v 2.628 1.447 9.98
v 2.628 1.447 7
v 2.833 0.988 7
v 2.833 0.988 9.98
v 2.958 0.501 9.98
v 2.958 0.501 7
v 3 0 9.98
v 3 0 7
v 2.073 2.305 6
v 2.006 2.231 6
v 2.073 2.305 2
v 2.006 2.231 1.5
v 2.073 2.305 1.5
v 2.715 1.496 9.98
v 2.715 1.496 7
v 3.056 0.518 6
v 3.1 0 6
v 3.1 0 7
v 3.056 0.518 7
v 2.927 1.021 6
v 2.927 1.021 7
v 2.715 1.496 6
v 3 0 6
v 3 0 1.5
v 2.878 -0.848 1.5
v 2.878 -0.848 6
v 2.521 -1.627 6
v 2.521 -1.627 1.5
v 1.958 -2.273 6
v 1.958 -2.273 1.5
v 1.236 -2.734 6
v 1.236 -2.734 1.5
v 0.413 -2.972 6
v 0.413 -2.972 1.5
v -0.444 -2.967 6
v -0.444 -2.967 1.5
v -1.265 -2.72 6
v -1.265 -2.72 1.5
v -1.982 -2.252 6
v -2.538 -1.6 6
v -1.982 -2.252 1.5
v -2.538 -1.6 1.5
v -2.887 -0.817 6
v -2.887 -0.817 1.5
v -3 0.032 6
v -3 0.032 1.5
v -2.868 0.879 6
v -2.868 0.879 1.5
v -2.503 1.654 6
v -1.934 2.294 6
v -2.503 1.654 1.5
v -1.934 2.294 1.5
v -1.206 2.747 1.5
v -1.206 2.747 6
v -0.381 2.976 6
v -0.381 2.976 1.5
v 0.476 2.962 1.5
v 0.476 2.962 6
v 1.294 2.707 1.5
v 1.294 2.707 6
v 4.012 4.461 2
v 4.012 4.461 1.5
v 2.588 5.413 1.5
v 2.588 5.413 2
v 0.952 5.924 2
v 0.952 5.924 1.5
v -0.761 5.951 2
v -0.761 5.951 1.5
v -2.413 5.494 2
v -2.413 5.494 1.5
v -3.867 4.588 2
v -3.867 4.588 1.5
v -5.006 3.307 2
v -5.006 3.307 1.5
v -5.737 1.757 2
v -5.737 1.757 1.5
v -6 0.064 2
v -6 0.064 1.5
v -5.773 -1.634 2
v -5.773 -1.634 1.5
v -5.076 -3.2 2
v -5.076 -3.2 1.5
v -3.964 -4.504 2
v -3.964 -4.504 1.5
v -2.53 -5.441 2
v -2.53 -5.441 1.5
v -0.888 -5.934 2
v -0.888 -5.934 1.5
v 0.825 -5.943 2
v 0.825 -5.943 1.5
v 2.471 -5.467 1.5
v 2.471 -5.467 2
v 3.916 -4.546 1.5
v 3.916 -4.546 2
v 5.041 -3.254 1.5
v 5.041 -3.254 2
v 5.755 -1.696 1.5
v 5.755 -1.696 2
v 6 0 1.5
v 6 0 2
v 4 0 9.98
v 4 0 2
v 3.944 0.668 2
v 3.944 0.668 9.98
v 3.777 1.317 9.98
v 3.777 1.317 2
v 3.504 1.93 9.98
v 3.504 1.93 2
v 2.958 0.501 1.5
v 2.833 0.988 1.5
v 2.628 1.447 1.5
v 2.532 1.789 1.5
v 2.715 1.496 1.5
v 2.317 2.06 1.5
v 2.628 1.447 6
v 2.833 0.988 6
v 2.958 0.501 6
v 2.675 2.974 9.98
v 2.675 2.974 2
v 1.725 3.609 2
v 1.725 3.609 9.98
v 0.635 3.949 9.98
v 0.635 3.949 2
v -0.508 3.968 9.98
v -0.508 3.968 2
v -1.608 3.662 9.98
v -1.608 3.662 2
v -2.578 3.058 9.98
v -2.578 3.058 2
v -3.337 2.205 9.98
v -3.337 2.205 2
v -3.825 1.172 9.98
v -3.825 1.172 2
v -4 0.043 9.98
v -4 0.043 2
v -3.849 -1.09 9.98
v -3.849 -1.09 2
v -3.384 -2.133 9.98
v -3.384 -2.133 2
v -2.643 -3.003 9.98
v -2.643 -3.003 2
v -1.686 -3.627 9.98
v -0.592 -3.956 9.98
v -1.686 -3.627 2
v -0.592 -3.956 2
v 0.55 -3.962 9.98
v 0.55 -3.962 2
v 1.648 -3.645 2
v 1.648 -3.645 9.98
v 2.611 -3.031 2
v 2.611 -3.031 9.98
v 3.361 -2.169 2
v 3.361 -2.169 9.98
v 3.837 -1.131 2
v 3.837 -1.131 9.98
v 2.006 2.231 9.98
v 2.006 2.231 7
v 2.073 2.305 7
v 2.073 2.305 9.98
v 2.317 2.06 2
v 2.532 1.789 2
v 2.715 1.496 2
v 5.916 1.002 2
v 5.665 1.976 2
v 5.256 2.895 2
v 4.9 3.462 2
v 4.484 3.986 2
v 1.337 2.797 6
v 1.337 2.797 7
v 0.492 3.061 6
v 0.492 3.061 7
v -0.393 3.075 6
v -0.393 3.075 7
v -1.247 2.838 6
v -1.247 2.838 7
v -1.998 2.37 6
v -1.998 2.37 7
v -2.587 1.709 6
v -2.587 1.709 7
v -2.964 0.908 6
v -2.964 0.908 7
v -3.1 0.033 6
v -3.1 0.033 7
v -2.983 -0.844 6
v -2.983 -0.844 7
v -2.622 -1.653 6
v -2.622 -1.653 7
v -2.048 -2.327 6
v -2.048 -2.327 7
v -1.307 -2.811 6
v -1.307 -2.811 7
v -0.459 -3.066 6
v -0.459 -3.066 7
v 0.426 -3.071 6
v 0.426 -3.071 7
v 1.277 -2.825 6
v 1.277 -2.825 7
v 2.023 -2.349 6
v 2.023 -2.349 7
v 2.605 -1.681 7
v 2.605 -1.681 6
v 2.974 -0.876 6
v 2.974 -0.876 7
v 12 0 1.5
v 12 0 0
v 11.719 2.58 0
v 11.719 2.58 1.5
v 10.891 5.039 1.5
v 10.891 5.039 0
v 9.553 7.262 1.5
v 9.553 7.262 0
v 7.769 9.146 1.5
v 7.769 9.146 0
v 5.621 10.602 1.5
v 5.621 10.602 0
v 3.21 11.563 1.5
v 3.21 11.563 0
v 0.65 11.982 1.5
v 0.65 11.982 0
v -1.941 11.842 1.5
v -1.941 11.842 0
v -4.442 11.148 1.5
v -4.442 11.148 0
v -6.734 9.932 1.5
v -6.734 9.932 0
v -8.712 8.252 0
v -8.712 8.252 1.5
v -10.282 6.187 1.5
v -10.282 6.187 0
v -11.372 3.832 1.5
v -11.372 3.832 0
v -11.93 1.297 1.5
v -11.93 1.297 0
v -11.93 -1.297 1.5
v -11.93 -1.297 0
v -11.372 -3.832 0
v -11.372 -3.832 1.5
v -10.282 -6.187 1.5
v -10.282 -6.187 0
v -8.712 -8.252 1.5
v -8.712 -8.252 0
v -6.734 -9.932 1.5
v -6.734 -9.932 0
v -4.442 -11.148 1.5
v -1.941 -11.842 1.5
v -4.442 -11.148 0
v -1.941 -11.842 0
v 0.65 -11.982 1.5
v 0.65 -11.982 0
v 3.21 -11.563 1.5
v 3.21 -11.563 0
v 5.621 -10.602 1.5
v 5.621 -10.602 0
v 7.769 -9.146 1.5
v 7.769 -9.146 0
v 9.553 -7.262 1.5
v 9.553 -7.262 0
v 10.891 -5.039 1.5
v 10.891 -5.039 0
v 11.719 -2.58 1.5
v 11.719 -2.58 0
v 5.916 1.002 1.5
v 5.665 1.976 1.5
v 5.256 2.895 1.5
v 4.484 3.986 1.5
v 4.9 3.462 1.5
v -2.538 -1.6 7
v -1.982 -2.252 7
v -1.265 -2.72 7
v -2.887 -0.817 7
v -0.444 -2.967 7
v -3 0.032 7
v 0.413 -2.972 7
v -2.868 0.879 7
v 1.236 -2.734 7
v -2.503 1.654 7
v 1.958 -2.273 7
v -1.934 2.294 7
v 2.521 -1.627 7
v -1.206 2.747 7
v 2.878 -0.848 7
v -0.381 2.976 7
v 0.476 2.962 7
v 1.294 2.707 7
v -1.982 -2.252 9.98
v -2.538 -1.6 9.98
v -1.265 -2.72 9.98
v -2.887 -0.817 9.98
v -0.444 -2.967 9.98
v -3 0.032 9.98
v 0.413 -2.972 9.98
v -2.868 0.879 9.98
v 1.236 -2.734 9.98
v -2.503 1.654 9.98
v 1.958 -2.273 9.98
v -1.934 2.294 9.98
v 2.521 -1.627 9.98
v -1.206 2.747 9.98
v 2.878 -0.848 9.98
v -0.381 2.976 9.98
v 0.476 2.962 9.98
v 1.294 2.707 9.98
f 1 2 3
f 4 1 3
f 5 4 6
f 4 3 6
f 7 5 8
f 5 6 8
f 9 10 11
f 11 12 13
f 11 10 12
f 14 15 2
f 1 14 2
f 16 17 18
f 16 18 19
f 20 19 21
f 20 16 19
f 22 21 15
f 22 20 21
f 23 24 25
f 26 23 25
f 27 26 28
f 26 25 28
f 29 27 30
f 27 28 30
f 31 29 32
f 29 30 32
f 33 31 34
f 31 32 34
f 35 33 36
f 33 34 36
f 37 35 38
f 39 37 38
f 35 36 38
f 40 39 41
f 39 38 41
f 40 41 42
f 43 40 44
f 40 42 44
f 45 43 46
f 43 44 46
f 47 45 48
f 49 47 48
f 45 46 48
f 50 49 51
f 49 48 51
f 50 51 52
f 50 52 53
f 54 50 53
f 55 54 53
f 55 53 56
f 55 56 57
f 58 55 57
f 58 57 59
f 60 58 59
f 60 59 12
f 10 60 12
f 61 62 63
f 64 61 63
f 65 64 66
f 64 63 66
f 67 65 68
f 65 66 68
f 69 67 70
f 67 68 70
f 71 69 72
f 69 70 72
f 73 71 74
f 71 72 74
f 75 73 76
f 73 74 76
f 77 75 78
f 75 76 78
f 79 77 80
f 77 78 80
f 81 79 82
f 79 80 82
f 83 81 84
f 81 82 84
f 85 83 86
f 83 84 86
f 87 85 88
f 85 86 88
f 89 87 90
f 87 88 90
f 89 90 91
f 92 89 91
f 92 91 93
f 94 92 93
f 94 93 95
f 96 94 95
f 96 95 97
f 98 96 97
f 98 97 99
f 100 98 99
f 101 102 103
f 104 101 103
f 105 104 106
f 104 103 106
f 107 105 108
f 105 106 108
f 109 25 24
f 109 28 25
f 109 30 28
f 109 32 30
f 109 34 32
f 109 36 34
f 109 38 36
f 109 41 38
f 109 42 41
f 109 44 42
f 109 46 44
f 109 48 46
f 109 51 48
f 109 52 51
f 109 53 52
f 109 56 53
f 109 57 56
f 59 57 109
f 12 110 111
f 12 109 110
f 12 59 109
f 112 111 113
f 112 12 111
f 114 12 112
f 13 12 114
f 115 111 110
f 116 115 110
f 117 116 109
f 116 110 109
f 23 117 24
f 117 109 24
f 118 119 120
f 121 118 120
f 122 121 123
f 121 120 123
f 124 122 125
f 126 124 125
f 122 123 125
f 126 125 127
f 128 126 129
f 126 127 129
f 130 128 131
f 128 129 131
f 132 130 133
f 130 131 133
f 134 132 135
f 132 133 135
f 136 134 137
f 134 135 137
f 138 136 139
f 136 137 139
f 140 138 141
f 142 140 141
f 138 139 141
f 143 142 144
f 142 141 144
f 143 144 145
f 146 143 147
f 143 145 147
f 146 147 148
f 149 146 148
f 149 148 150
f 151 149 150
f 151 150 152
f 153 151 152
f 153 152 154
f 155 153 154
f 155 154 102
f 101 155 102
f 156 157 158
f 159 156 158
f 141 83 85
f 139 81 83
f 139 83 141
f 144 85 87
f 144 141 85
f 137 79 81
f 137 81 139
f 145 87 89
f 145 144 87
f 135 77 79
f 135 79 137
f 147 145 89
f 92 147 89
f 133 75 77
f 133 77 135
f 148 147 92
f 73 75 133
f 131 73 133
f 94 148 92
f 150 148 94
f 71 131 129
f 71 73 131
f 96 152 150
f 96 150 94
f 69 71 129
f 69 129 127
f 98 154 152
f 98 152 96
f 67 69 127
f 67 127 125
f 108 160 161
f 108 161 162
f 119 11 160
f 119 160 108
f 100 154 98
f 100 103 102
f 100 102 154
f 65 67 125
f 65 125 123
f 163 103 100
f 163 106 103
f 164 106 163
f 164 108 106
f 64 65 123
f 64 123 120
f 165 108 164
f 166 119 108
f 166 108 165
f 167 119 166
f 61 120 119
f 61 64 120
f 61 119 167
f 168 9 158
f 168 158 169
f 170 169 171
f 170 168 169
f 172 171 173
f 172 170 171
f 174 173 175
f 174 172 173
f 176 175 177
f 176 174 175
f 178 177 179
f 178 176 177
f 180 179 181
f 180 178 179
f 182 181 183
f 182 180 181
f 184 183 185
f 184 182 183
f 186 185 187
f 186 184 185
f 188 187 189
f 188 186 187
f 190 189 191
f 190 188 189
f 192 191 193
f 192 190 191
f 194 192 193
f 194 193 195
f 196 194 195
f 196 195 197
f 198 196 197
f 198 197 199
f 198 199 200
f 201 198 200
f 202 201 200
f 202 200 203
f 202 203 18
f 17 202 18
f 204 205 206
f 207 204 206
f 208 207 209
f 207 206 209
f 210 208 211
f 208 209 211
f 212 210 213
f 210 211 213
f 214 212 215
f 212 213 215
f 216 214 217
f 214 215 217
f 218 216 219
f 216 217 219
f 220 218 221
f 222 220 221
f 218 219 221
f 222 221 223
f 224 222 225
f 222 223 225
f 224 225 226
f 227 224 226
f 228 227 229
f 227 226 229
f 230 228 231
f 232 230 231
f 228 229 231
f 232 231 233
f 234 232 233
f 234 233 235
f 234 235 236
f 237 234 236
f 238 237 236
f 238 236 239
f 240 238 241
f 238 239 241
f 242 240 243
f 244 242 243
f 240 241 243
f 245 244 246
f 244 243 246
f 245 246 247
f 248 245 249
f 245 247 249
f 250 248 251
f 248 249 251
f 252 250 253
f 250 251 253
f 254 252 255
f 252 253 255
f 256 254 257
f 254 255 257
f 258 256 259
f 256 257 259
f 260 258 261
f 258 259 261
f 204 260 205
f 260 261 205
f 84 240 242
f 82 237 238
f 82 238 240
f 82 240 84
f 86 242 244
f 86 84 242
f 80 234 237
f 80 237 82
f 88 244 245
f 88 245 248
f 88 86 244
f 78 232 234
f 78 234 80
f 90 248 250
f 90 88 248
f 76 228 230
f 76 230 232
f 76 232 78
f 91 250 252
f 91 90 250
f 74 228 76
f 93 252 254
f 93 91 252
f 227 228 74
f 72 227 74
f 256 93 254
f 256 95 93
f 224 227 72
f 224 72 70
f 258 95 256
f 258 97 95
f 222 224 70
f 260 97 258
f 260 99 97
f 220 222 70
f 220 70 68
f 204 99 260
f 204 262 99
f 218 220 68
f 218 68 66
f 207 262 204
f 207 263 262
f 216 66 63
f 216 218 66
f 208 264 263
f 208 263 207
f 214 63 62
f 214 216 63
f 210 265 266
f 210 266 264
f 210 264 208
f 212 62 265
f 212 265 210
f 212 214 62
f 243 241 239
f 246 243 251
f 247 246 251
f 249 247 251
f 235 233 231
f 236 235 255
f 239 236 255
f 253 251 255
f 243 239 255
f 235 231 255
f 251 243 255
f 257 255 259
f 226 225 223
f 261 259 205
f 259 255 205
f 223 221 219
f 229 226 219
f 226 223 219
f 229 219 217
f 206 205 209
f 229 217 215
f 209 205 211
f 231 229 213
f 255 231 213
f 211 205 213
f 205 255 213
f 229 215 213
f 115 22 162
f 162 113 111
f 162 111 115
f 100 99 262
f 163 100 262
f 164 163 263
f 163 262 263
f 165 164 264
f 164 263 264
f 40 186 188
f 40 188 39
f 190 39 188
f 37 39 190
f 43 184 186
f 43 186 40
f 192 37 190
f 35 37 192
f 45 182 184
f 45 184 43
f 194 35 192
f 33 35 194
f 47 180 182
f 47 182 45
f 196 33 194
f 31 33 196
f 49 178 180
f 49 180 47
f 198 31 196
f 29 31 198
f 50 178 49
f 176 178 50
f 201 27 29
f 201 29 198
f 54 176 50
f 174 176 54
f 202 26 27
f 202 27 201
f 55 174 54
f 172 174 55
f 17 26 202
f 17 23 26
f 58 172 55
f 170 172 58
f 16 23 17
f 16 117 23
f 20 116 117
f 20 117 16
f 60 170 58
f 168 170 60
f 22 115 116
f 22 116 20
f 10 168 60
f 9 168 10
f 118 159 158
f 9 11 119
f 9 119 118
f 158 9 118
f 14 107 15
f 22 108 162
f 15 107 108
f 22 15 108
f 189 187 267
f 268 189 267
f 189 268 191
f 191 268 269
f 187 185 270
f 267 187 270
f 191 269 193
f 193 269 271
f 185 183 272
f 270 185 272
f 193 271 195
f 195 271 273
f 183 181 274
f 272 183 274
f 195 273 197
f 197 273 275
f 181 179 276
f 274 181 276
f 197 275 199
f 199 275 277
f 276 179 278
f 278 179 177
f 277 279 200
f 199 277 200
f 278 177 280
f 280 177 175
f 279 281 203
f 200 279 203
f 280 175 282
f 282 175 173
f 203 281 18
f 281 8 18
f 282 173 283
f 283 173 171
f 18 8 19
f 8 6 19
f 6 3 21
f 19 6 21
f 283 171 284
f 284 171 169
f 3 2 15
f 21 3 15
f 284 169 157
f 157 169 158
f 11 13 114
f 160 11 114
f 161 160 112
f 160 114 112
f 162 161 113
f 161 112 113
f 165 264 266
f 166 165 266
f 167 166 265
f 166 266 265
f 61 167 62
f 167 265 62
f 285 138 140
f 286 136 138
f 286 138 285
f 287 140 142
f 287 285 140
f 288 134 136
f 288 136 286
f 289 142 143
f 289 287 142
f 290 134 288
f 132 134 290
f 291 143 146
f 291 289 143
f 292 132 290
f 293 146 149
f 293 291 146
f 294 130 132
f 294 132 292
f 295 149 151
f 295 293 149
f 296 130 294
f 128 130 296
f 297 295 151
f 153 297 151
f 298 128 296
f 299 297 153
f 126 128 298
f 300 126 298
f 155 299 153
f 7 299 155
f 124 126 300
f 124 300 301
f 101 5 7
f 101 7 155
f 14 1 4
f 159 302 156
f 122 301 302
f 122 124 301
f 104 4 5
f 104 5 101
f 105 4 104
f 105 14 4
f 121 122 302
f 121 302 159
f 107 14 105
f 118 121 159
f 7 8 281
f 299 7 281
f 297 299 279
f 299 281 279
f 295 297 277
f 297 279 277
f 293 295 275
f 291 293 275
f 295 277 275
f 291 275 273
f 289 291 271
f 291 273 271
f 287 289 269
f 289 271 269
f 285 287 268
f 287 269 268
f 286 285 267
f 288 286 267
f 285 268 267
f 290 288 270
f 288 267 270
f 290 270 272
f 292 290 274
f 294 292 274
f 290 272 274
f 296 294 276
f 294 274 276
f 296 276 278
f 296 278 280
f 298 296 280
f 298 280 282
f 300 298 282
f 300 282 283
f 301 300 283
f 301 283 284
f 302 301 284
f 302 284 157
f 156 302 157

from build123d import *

# Parameters (mm, degrees)
F0_R     = 12
F1_DEPTH = 1.5
F2_DEPTH = 2
F3_DEPTH = 9.98
F4_DEPTH = 1


with BuildPart() as f1:
    # F0 (on Top) → F1 (new body)
    with BuildSketch(Plane.XY):
        Circle(F0_R)
        with BuildLine():
            ThreePointArc((4.0121757808, 4.461215698), (4.6995946202, 3.7301220363), (5.2555497929, 2.8946841579))
            ThreePointArc((5.2555497929, 2.8946841579), (5.810907793, 1.4944399022), (6, 0))
            ThreePointArc((6, 0), (-5.4805590356, -2.4420222476), (4.0121757808, 4.461215698))
        make_face(mode=Mode.SUBTRACT)
        with BuildLine():
            ThreePointArc((2.6747838539, 2.9741437986), (3.1330630801, 2.4867480242), (3.503699862, 1.9297894386))
            Line((3.503699862, 1.9297894386), (5.2555497929, 2.8946841579))
            ThreePointArc((5.2555497929, 2.8946841579), (4.6995946202, 3.7301220363), (4.0121757808, 4.461215698))
            Line((4.0121757808, 4.461215698), (2.6747838539, 2.9741437986))
        make_face()
        with BuildLine():
            Line((5.2555497929, 2.8946841579), (3.503699862, 1.9297894386))
            ThreePointArc((3.503699862, 1.9297894386), (3.8739385287, 0.9962932681), (4, 0))
            ThreePointArc((4, 0), (-3.6537060237, -1.6280148317), (2.6747838539, 2.9741437986))
            Line((2.6747838539, 2.9741437986), (4.0121757808, 4.461215698))
            ThreePointArc((4.0121757808, 4.461215698), (-5.4805590356, -2.4420222476), (6, 0))
            ThreePointArc((6, 0), (5.810907793, 1.4944399022), (5.2555497929, 2.8946841579))
        make_face()
        with BuildLine():
            ThreePointArc((2.0060878904, 2.230607849), (2.3497973101, 1.8650610182), (2.6277748965, 1.447342079))
            Line((2.6277748965, 1.447342079), (2.715367393, 1.4955868149))
            ThreePointArc((2.715367393, 1.4955868149), (2.4281238871, 1.9272297188), (2.0729574868, 2.304961444))
            Line((2.0729574868, 2.304961444), (2.0060878904, 2.230607849))
        make_face()
        with BuildLine():
            ThreePointArc((2.6277748965, 1.447342079), (2.9054538965, 0.7472199511), (3, 0))
            ThreePointArc((3, 0), (-2.7402795178, -1.2210111238), (2.0060878904, 2.230607849))
            Line((2.0060878904, 2.230607849), (2.0729574868, 2.304961444))
            ThreePointArc((2.0729574868, 2.304961444), (-2.8316221684, -1.2617114946), (3.1, 0))
            ThreePointArc((3.1, 0), (3.0023023597, 0.7721272828), (2.715367393, 1.4955868149))
            Line((2.715367393, 1.4955868149), (2.6277748965, 1.447342079))
        make_face()
        with BuildLine():
            Line((0, 0), (2.6277748965, 1.447342079))
            ThreePointArc((2.6277748965, 1.447342079), (2.3497973101, 1.8650610182), (2.0060878904, 2.230607849))
            Line((2.0060878904, 2.230607849), (0, 0))
        make_face()
        with BuildLine():
            ThreePointArc((2.0060878904, 2.230607849), (-2.7402795178, -1.2210111238), (3, 0))
            ThreePointArc((3, 0), (2.9054538965, 0.7472199511), (2.6277748965, 1.447342079))
            Line((2.6277748965, 1.447342079), (0, 0))
            Line((0, 0), (2.0060878904, 2.230607849))
        make_face()
        with BuildLine():
            Line((3.503699862, 1.9297894386), (2.715367393, 1.4955868149))
            ThreePointArc((2.715367393, 1.4955868149), (3.0023023597, 0.7721272828), (3.1, 0))
            ThreePointArc((3.1, 0), (-2.8316221684, -1.2617114946), (2.0729574868, 2.304961444))
            Line((2.0729574868, 2.304961444), (2.6747838539, 2.9741437986))
            ThreePointArc((2.6747838539, 2.9741437986), (-3.6537060237, -1.6280148317), (4, 0))
            ThreePointArc((4, 0), (3.8739385287, 0.9962932681), (3.503699862, 1.9297894386))
        make_face()
        with BuildLine():
            ThreePointArc((2.0729574868, 2.304961444), (2.4281238871, 1.9272297188), (2.715367393, 1.4955868149))
            Line((2.715367393, 1.4955868149), (3.503699862, 1.9297894386))
            ThreePointArc((3.503699862, 1.9297894386), (3.1330630801, 2.4867480242), (2.6747838539, 2.9741437986))
            Line((2.6747838539, 2.9741437986), (2.0729574868, 2.304961444))
        make_face()
    extrude(amount=F1_DEPTH)



with BuildPart() as f2:
    # F0 (on Top) → F2 (new body)
    with BuildSketch(Plane.XY):
        with BuildLine():
            ThreePointArc((2.6747838539, 2.9741437986), (3.1330630801, 2.4867480242), (3.503699862, 1.9297894386))
            Line((3.503699862, 1.9297894386), (5.2555497929, 2.8946841579))
            ThreePointArc((5.2555497929, 2.8946841579), (4.6995946202, 3.7301220363), (4.0121757808, 4.461215698))
            Line((4.0121757808, 4.461215698), (2.6747838539, 2.9741437986))
        make_face()
        with BuildLine():
            Line((5.2555497929, 2.8946841579), (3.503699862, 1.9297894386))
            ThreePointArc((3.503699862, 1.9297894386), (3.8739385287, 0.9962932681), (4, 0))
            ThreePointArc((4, 0), (-3.6537060237, -1.6280148317), (2.6747838539, 2.9741437986))
            Line((2.6747838539, 2.9741437986), (4.0121757808, 4.461215698))
            ThreePointArc((4.0121757808, 4.461215698), (-5.4805590356, -2.4420222476), (6, 0))
            ThreePointArc((6, 0), (5.810907793, 1.4944399022), (5.2555497929, 2.8946841579))
        make_face()
        with BuildLine():
            Line((3.503699862, 1.9297894386), (2.715367393, 1.4955868149))
            ThreePointArc((2.715367393, 1.4955868149), (3.0023023597, 0.7721272828), (3.1, 0))
            ThreePointArc((3.1, 0), (-2.8316221684, -1.2617114946), (2.0729574868, 2.304961444))
            Line((2.0729574868, 2.304961444), (2.6747838539, 2.9741437986))
            ThreePointArc((2.6747838539, 2.9741437986), (-3.6537060237, -1.6280148317), (4, 0))
            ThreePointArc((4, 0), (3.8739385287, 0.9962932681), (3.503699862, 1.9297894386))
        make_face()
        with BuildLine():
            ThreePointArc((2.0729574868, 2.304961444), (2.4281238871, 1.9272297188), (2.715367393, 1.4955868149))
            Line((2.715367393, 1.4955868149), (3.503699862, 1.9297894386))
            ThreePointArc((3.503699862, 1.9297894386), (3.1330630801, 2.4867480242), (2.6747838539, 2.9741437986))
            Line((2.6747838539, 2.9741437986), (2.0729574868, 2.304961444))
        make_face()
    extrude(amount=F2_DEPTH)


with BuildPart() as f1_1:
    add(f1.part)

    add(f2.part)  # F3 merges F2
    # F0 (on Top) → F3 (join)
    with BuildSketch(Plane.XY):
        with BuildLine():
            ThreePointArc((2.6277748965, 1.447342079), (2.9054538965, 0.7472199511), (3, 0))
            ThreePointArc((3, 0), (-2.7402795178, -1.2210111238), (2.0060878904, 2.230607849))
            Line((2.0060878904, 2.230607849), (2.0729574868, 2.304961444))
            ThreePointArc((2.0729574868, 2.304961444), (-2.8316221684, -1.2617114946), (3.1, 0))
            ThreePointArc((3.1, 0), (3.0023023597, 0.7721272828), (2.715367393, 1.4955868149))
            Line((2.715367393, 1.4955868149), (2.6277748965, 1.447342079))
        make_face()
        with BuildLine():
            Line((3.503699862, 1.9297894386), (2.715367393, 1.4955868149))
            ThreePointArc((2.715367393, 1.4955868149), (3.0023023597, 0.7721272828), (3.1, 0))
            ThreePointArc((3.1, 0), (-2.8316221684, -1.2617114946), (2.0729574868, 2.304961444))
            Line((2.0729574868, 2.304961444), (2.6747838539, 2.9741437986))
            ThreePointArc((2.6747838539, 2.9741437986), (-3.6537060237, -1.6280148317), (4, 0))
            ThreePointArc((4, 0), (3.8739385287, 0.9962932681), (3.503699862, 1.9297894386))
        make_face()
    extrude(amount=F3_DEPTH)


with BuildPart() as f4:
    # F0 (on Top) → F4 (new body)
    with BuildSketch(Plane.XY):
        with BuildLine():
            ThreePointArc((2.6277748965, 1.447342079), (2.9054538965, 0.7472199511), (3, 0))
            ThreePointArc((3, 0), (-2.7402795178, -1.2210111238), (2.0060878904, 2.230607849))
            Line((2.0060878904, 2.230607849), (2.0729574868, 2.304961444))
            ThreePointArc((2.0729574868, 2.304961444), (-2.8316221684, -1.2617114946), (3.1, 0))
            ThreePointArc((3.1, 0), (3.0023023597, 0.7721272828), (2.715367393, 1.4955868149))
            Line((2.715367393, 1.4955868149), (2.6277748965, 1.447342079))
        make_face()
    extrude(amount=F4_DEPTH)


with BuildPart() as f4_1:
    # F5: moved
    add(f4.part.moved(Location((0, 0, 6))))


with BuildPart() as f1_2:
    add(f1_1.part)

    # F6: cut F4
    add(f4_1.part, mode=Mode.SUBTRACT)


solid = f1_2.part
